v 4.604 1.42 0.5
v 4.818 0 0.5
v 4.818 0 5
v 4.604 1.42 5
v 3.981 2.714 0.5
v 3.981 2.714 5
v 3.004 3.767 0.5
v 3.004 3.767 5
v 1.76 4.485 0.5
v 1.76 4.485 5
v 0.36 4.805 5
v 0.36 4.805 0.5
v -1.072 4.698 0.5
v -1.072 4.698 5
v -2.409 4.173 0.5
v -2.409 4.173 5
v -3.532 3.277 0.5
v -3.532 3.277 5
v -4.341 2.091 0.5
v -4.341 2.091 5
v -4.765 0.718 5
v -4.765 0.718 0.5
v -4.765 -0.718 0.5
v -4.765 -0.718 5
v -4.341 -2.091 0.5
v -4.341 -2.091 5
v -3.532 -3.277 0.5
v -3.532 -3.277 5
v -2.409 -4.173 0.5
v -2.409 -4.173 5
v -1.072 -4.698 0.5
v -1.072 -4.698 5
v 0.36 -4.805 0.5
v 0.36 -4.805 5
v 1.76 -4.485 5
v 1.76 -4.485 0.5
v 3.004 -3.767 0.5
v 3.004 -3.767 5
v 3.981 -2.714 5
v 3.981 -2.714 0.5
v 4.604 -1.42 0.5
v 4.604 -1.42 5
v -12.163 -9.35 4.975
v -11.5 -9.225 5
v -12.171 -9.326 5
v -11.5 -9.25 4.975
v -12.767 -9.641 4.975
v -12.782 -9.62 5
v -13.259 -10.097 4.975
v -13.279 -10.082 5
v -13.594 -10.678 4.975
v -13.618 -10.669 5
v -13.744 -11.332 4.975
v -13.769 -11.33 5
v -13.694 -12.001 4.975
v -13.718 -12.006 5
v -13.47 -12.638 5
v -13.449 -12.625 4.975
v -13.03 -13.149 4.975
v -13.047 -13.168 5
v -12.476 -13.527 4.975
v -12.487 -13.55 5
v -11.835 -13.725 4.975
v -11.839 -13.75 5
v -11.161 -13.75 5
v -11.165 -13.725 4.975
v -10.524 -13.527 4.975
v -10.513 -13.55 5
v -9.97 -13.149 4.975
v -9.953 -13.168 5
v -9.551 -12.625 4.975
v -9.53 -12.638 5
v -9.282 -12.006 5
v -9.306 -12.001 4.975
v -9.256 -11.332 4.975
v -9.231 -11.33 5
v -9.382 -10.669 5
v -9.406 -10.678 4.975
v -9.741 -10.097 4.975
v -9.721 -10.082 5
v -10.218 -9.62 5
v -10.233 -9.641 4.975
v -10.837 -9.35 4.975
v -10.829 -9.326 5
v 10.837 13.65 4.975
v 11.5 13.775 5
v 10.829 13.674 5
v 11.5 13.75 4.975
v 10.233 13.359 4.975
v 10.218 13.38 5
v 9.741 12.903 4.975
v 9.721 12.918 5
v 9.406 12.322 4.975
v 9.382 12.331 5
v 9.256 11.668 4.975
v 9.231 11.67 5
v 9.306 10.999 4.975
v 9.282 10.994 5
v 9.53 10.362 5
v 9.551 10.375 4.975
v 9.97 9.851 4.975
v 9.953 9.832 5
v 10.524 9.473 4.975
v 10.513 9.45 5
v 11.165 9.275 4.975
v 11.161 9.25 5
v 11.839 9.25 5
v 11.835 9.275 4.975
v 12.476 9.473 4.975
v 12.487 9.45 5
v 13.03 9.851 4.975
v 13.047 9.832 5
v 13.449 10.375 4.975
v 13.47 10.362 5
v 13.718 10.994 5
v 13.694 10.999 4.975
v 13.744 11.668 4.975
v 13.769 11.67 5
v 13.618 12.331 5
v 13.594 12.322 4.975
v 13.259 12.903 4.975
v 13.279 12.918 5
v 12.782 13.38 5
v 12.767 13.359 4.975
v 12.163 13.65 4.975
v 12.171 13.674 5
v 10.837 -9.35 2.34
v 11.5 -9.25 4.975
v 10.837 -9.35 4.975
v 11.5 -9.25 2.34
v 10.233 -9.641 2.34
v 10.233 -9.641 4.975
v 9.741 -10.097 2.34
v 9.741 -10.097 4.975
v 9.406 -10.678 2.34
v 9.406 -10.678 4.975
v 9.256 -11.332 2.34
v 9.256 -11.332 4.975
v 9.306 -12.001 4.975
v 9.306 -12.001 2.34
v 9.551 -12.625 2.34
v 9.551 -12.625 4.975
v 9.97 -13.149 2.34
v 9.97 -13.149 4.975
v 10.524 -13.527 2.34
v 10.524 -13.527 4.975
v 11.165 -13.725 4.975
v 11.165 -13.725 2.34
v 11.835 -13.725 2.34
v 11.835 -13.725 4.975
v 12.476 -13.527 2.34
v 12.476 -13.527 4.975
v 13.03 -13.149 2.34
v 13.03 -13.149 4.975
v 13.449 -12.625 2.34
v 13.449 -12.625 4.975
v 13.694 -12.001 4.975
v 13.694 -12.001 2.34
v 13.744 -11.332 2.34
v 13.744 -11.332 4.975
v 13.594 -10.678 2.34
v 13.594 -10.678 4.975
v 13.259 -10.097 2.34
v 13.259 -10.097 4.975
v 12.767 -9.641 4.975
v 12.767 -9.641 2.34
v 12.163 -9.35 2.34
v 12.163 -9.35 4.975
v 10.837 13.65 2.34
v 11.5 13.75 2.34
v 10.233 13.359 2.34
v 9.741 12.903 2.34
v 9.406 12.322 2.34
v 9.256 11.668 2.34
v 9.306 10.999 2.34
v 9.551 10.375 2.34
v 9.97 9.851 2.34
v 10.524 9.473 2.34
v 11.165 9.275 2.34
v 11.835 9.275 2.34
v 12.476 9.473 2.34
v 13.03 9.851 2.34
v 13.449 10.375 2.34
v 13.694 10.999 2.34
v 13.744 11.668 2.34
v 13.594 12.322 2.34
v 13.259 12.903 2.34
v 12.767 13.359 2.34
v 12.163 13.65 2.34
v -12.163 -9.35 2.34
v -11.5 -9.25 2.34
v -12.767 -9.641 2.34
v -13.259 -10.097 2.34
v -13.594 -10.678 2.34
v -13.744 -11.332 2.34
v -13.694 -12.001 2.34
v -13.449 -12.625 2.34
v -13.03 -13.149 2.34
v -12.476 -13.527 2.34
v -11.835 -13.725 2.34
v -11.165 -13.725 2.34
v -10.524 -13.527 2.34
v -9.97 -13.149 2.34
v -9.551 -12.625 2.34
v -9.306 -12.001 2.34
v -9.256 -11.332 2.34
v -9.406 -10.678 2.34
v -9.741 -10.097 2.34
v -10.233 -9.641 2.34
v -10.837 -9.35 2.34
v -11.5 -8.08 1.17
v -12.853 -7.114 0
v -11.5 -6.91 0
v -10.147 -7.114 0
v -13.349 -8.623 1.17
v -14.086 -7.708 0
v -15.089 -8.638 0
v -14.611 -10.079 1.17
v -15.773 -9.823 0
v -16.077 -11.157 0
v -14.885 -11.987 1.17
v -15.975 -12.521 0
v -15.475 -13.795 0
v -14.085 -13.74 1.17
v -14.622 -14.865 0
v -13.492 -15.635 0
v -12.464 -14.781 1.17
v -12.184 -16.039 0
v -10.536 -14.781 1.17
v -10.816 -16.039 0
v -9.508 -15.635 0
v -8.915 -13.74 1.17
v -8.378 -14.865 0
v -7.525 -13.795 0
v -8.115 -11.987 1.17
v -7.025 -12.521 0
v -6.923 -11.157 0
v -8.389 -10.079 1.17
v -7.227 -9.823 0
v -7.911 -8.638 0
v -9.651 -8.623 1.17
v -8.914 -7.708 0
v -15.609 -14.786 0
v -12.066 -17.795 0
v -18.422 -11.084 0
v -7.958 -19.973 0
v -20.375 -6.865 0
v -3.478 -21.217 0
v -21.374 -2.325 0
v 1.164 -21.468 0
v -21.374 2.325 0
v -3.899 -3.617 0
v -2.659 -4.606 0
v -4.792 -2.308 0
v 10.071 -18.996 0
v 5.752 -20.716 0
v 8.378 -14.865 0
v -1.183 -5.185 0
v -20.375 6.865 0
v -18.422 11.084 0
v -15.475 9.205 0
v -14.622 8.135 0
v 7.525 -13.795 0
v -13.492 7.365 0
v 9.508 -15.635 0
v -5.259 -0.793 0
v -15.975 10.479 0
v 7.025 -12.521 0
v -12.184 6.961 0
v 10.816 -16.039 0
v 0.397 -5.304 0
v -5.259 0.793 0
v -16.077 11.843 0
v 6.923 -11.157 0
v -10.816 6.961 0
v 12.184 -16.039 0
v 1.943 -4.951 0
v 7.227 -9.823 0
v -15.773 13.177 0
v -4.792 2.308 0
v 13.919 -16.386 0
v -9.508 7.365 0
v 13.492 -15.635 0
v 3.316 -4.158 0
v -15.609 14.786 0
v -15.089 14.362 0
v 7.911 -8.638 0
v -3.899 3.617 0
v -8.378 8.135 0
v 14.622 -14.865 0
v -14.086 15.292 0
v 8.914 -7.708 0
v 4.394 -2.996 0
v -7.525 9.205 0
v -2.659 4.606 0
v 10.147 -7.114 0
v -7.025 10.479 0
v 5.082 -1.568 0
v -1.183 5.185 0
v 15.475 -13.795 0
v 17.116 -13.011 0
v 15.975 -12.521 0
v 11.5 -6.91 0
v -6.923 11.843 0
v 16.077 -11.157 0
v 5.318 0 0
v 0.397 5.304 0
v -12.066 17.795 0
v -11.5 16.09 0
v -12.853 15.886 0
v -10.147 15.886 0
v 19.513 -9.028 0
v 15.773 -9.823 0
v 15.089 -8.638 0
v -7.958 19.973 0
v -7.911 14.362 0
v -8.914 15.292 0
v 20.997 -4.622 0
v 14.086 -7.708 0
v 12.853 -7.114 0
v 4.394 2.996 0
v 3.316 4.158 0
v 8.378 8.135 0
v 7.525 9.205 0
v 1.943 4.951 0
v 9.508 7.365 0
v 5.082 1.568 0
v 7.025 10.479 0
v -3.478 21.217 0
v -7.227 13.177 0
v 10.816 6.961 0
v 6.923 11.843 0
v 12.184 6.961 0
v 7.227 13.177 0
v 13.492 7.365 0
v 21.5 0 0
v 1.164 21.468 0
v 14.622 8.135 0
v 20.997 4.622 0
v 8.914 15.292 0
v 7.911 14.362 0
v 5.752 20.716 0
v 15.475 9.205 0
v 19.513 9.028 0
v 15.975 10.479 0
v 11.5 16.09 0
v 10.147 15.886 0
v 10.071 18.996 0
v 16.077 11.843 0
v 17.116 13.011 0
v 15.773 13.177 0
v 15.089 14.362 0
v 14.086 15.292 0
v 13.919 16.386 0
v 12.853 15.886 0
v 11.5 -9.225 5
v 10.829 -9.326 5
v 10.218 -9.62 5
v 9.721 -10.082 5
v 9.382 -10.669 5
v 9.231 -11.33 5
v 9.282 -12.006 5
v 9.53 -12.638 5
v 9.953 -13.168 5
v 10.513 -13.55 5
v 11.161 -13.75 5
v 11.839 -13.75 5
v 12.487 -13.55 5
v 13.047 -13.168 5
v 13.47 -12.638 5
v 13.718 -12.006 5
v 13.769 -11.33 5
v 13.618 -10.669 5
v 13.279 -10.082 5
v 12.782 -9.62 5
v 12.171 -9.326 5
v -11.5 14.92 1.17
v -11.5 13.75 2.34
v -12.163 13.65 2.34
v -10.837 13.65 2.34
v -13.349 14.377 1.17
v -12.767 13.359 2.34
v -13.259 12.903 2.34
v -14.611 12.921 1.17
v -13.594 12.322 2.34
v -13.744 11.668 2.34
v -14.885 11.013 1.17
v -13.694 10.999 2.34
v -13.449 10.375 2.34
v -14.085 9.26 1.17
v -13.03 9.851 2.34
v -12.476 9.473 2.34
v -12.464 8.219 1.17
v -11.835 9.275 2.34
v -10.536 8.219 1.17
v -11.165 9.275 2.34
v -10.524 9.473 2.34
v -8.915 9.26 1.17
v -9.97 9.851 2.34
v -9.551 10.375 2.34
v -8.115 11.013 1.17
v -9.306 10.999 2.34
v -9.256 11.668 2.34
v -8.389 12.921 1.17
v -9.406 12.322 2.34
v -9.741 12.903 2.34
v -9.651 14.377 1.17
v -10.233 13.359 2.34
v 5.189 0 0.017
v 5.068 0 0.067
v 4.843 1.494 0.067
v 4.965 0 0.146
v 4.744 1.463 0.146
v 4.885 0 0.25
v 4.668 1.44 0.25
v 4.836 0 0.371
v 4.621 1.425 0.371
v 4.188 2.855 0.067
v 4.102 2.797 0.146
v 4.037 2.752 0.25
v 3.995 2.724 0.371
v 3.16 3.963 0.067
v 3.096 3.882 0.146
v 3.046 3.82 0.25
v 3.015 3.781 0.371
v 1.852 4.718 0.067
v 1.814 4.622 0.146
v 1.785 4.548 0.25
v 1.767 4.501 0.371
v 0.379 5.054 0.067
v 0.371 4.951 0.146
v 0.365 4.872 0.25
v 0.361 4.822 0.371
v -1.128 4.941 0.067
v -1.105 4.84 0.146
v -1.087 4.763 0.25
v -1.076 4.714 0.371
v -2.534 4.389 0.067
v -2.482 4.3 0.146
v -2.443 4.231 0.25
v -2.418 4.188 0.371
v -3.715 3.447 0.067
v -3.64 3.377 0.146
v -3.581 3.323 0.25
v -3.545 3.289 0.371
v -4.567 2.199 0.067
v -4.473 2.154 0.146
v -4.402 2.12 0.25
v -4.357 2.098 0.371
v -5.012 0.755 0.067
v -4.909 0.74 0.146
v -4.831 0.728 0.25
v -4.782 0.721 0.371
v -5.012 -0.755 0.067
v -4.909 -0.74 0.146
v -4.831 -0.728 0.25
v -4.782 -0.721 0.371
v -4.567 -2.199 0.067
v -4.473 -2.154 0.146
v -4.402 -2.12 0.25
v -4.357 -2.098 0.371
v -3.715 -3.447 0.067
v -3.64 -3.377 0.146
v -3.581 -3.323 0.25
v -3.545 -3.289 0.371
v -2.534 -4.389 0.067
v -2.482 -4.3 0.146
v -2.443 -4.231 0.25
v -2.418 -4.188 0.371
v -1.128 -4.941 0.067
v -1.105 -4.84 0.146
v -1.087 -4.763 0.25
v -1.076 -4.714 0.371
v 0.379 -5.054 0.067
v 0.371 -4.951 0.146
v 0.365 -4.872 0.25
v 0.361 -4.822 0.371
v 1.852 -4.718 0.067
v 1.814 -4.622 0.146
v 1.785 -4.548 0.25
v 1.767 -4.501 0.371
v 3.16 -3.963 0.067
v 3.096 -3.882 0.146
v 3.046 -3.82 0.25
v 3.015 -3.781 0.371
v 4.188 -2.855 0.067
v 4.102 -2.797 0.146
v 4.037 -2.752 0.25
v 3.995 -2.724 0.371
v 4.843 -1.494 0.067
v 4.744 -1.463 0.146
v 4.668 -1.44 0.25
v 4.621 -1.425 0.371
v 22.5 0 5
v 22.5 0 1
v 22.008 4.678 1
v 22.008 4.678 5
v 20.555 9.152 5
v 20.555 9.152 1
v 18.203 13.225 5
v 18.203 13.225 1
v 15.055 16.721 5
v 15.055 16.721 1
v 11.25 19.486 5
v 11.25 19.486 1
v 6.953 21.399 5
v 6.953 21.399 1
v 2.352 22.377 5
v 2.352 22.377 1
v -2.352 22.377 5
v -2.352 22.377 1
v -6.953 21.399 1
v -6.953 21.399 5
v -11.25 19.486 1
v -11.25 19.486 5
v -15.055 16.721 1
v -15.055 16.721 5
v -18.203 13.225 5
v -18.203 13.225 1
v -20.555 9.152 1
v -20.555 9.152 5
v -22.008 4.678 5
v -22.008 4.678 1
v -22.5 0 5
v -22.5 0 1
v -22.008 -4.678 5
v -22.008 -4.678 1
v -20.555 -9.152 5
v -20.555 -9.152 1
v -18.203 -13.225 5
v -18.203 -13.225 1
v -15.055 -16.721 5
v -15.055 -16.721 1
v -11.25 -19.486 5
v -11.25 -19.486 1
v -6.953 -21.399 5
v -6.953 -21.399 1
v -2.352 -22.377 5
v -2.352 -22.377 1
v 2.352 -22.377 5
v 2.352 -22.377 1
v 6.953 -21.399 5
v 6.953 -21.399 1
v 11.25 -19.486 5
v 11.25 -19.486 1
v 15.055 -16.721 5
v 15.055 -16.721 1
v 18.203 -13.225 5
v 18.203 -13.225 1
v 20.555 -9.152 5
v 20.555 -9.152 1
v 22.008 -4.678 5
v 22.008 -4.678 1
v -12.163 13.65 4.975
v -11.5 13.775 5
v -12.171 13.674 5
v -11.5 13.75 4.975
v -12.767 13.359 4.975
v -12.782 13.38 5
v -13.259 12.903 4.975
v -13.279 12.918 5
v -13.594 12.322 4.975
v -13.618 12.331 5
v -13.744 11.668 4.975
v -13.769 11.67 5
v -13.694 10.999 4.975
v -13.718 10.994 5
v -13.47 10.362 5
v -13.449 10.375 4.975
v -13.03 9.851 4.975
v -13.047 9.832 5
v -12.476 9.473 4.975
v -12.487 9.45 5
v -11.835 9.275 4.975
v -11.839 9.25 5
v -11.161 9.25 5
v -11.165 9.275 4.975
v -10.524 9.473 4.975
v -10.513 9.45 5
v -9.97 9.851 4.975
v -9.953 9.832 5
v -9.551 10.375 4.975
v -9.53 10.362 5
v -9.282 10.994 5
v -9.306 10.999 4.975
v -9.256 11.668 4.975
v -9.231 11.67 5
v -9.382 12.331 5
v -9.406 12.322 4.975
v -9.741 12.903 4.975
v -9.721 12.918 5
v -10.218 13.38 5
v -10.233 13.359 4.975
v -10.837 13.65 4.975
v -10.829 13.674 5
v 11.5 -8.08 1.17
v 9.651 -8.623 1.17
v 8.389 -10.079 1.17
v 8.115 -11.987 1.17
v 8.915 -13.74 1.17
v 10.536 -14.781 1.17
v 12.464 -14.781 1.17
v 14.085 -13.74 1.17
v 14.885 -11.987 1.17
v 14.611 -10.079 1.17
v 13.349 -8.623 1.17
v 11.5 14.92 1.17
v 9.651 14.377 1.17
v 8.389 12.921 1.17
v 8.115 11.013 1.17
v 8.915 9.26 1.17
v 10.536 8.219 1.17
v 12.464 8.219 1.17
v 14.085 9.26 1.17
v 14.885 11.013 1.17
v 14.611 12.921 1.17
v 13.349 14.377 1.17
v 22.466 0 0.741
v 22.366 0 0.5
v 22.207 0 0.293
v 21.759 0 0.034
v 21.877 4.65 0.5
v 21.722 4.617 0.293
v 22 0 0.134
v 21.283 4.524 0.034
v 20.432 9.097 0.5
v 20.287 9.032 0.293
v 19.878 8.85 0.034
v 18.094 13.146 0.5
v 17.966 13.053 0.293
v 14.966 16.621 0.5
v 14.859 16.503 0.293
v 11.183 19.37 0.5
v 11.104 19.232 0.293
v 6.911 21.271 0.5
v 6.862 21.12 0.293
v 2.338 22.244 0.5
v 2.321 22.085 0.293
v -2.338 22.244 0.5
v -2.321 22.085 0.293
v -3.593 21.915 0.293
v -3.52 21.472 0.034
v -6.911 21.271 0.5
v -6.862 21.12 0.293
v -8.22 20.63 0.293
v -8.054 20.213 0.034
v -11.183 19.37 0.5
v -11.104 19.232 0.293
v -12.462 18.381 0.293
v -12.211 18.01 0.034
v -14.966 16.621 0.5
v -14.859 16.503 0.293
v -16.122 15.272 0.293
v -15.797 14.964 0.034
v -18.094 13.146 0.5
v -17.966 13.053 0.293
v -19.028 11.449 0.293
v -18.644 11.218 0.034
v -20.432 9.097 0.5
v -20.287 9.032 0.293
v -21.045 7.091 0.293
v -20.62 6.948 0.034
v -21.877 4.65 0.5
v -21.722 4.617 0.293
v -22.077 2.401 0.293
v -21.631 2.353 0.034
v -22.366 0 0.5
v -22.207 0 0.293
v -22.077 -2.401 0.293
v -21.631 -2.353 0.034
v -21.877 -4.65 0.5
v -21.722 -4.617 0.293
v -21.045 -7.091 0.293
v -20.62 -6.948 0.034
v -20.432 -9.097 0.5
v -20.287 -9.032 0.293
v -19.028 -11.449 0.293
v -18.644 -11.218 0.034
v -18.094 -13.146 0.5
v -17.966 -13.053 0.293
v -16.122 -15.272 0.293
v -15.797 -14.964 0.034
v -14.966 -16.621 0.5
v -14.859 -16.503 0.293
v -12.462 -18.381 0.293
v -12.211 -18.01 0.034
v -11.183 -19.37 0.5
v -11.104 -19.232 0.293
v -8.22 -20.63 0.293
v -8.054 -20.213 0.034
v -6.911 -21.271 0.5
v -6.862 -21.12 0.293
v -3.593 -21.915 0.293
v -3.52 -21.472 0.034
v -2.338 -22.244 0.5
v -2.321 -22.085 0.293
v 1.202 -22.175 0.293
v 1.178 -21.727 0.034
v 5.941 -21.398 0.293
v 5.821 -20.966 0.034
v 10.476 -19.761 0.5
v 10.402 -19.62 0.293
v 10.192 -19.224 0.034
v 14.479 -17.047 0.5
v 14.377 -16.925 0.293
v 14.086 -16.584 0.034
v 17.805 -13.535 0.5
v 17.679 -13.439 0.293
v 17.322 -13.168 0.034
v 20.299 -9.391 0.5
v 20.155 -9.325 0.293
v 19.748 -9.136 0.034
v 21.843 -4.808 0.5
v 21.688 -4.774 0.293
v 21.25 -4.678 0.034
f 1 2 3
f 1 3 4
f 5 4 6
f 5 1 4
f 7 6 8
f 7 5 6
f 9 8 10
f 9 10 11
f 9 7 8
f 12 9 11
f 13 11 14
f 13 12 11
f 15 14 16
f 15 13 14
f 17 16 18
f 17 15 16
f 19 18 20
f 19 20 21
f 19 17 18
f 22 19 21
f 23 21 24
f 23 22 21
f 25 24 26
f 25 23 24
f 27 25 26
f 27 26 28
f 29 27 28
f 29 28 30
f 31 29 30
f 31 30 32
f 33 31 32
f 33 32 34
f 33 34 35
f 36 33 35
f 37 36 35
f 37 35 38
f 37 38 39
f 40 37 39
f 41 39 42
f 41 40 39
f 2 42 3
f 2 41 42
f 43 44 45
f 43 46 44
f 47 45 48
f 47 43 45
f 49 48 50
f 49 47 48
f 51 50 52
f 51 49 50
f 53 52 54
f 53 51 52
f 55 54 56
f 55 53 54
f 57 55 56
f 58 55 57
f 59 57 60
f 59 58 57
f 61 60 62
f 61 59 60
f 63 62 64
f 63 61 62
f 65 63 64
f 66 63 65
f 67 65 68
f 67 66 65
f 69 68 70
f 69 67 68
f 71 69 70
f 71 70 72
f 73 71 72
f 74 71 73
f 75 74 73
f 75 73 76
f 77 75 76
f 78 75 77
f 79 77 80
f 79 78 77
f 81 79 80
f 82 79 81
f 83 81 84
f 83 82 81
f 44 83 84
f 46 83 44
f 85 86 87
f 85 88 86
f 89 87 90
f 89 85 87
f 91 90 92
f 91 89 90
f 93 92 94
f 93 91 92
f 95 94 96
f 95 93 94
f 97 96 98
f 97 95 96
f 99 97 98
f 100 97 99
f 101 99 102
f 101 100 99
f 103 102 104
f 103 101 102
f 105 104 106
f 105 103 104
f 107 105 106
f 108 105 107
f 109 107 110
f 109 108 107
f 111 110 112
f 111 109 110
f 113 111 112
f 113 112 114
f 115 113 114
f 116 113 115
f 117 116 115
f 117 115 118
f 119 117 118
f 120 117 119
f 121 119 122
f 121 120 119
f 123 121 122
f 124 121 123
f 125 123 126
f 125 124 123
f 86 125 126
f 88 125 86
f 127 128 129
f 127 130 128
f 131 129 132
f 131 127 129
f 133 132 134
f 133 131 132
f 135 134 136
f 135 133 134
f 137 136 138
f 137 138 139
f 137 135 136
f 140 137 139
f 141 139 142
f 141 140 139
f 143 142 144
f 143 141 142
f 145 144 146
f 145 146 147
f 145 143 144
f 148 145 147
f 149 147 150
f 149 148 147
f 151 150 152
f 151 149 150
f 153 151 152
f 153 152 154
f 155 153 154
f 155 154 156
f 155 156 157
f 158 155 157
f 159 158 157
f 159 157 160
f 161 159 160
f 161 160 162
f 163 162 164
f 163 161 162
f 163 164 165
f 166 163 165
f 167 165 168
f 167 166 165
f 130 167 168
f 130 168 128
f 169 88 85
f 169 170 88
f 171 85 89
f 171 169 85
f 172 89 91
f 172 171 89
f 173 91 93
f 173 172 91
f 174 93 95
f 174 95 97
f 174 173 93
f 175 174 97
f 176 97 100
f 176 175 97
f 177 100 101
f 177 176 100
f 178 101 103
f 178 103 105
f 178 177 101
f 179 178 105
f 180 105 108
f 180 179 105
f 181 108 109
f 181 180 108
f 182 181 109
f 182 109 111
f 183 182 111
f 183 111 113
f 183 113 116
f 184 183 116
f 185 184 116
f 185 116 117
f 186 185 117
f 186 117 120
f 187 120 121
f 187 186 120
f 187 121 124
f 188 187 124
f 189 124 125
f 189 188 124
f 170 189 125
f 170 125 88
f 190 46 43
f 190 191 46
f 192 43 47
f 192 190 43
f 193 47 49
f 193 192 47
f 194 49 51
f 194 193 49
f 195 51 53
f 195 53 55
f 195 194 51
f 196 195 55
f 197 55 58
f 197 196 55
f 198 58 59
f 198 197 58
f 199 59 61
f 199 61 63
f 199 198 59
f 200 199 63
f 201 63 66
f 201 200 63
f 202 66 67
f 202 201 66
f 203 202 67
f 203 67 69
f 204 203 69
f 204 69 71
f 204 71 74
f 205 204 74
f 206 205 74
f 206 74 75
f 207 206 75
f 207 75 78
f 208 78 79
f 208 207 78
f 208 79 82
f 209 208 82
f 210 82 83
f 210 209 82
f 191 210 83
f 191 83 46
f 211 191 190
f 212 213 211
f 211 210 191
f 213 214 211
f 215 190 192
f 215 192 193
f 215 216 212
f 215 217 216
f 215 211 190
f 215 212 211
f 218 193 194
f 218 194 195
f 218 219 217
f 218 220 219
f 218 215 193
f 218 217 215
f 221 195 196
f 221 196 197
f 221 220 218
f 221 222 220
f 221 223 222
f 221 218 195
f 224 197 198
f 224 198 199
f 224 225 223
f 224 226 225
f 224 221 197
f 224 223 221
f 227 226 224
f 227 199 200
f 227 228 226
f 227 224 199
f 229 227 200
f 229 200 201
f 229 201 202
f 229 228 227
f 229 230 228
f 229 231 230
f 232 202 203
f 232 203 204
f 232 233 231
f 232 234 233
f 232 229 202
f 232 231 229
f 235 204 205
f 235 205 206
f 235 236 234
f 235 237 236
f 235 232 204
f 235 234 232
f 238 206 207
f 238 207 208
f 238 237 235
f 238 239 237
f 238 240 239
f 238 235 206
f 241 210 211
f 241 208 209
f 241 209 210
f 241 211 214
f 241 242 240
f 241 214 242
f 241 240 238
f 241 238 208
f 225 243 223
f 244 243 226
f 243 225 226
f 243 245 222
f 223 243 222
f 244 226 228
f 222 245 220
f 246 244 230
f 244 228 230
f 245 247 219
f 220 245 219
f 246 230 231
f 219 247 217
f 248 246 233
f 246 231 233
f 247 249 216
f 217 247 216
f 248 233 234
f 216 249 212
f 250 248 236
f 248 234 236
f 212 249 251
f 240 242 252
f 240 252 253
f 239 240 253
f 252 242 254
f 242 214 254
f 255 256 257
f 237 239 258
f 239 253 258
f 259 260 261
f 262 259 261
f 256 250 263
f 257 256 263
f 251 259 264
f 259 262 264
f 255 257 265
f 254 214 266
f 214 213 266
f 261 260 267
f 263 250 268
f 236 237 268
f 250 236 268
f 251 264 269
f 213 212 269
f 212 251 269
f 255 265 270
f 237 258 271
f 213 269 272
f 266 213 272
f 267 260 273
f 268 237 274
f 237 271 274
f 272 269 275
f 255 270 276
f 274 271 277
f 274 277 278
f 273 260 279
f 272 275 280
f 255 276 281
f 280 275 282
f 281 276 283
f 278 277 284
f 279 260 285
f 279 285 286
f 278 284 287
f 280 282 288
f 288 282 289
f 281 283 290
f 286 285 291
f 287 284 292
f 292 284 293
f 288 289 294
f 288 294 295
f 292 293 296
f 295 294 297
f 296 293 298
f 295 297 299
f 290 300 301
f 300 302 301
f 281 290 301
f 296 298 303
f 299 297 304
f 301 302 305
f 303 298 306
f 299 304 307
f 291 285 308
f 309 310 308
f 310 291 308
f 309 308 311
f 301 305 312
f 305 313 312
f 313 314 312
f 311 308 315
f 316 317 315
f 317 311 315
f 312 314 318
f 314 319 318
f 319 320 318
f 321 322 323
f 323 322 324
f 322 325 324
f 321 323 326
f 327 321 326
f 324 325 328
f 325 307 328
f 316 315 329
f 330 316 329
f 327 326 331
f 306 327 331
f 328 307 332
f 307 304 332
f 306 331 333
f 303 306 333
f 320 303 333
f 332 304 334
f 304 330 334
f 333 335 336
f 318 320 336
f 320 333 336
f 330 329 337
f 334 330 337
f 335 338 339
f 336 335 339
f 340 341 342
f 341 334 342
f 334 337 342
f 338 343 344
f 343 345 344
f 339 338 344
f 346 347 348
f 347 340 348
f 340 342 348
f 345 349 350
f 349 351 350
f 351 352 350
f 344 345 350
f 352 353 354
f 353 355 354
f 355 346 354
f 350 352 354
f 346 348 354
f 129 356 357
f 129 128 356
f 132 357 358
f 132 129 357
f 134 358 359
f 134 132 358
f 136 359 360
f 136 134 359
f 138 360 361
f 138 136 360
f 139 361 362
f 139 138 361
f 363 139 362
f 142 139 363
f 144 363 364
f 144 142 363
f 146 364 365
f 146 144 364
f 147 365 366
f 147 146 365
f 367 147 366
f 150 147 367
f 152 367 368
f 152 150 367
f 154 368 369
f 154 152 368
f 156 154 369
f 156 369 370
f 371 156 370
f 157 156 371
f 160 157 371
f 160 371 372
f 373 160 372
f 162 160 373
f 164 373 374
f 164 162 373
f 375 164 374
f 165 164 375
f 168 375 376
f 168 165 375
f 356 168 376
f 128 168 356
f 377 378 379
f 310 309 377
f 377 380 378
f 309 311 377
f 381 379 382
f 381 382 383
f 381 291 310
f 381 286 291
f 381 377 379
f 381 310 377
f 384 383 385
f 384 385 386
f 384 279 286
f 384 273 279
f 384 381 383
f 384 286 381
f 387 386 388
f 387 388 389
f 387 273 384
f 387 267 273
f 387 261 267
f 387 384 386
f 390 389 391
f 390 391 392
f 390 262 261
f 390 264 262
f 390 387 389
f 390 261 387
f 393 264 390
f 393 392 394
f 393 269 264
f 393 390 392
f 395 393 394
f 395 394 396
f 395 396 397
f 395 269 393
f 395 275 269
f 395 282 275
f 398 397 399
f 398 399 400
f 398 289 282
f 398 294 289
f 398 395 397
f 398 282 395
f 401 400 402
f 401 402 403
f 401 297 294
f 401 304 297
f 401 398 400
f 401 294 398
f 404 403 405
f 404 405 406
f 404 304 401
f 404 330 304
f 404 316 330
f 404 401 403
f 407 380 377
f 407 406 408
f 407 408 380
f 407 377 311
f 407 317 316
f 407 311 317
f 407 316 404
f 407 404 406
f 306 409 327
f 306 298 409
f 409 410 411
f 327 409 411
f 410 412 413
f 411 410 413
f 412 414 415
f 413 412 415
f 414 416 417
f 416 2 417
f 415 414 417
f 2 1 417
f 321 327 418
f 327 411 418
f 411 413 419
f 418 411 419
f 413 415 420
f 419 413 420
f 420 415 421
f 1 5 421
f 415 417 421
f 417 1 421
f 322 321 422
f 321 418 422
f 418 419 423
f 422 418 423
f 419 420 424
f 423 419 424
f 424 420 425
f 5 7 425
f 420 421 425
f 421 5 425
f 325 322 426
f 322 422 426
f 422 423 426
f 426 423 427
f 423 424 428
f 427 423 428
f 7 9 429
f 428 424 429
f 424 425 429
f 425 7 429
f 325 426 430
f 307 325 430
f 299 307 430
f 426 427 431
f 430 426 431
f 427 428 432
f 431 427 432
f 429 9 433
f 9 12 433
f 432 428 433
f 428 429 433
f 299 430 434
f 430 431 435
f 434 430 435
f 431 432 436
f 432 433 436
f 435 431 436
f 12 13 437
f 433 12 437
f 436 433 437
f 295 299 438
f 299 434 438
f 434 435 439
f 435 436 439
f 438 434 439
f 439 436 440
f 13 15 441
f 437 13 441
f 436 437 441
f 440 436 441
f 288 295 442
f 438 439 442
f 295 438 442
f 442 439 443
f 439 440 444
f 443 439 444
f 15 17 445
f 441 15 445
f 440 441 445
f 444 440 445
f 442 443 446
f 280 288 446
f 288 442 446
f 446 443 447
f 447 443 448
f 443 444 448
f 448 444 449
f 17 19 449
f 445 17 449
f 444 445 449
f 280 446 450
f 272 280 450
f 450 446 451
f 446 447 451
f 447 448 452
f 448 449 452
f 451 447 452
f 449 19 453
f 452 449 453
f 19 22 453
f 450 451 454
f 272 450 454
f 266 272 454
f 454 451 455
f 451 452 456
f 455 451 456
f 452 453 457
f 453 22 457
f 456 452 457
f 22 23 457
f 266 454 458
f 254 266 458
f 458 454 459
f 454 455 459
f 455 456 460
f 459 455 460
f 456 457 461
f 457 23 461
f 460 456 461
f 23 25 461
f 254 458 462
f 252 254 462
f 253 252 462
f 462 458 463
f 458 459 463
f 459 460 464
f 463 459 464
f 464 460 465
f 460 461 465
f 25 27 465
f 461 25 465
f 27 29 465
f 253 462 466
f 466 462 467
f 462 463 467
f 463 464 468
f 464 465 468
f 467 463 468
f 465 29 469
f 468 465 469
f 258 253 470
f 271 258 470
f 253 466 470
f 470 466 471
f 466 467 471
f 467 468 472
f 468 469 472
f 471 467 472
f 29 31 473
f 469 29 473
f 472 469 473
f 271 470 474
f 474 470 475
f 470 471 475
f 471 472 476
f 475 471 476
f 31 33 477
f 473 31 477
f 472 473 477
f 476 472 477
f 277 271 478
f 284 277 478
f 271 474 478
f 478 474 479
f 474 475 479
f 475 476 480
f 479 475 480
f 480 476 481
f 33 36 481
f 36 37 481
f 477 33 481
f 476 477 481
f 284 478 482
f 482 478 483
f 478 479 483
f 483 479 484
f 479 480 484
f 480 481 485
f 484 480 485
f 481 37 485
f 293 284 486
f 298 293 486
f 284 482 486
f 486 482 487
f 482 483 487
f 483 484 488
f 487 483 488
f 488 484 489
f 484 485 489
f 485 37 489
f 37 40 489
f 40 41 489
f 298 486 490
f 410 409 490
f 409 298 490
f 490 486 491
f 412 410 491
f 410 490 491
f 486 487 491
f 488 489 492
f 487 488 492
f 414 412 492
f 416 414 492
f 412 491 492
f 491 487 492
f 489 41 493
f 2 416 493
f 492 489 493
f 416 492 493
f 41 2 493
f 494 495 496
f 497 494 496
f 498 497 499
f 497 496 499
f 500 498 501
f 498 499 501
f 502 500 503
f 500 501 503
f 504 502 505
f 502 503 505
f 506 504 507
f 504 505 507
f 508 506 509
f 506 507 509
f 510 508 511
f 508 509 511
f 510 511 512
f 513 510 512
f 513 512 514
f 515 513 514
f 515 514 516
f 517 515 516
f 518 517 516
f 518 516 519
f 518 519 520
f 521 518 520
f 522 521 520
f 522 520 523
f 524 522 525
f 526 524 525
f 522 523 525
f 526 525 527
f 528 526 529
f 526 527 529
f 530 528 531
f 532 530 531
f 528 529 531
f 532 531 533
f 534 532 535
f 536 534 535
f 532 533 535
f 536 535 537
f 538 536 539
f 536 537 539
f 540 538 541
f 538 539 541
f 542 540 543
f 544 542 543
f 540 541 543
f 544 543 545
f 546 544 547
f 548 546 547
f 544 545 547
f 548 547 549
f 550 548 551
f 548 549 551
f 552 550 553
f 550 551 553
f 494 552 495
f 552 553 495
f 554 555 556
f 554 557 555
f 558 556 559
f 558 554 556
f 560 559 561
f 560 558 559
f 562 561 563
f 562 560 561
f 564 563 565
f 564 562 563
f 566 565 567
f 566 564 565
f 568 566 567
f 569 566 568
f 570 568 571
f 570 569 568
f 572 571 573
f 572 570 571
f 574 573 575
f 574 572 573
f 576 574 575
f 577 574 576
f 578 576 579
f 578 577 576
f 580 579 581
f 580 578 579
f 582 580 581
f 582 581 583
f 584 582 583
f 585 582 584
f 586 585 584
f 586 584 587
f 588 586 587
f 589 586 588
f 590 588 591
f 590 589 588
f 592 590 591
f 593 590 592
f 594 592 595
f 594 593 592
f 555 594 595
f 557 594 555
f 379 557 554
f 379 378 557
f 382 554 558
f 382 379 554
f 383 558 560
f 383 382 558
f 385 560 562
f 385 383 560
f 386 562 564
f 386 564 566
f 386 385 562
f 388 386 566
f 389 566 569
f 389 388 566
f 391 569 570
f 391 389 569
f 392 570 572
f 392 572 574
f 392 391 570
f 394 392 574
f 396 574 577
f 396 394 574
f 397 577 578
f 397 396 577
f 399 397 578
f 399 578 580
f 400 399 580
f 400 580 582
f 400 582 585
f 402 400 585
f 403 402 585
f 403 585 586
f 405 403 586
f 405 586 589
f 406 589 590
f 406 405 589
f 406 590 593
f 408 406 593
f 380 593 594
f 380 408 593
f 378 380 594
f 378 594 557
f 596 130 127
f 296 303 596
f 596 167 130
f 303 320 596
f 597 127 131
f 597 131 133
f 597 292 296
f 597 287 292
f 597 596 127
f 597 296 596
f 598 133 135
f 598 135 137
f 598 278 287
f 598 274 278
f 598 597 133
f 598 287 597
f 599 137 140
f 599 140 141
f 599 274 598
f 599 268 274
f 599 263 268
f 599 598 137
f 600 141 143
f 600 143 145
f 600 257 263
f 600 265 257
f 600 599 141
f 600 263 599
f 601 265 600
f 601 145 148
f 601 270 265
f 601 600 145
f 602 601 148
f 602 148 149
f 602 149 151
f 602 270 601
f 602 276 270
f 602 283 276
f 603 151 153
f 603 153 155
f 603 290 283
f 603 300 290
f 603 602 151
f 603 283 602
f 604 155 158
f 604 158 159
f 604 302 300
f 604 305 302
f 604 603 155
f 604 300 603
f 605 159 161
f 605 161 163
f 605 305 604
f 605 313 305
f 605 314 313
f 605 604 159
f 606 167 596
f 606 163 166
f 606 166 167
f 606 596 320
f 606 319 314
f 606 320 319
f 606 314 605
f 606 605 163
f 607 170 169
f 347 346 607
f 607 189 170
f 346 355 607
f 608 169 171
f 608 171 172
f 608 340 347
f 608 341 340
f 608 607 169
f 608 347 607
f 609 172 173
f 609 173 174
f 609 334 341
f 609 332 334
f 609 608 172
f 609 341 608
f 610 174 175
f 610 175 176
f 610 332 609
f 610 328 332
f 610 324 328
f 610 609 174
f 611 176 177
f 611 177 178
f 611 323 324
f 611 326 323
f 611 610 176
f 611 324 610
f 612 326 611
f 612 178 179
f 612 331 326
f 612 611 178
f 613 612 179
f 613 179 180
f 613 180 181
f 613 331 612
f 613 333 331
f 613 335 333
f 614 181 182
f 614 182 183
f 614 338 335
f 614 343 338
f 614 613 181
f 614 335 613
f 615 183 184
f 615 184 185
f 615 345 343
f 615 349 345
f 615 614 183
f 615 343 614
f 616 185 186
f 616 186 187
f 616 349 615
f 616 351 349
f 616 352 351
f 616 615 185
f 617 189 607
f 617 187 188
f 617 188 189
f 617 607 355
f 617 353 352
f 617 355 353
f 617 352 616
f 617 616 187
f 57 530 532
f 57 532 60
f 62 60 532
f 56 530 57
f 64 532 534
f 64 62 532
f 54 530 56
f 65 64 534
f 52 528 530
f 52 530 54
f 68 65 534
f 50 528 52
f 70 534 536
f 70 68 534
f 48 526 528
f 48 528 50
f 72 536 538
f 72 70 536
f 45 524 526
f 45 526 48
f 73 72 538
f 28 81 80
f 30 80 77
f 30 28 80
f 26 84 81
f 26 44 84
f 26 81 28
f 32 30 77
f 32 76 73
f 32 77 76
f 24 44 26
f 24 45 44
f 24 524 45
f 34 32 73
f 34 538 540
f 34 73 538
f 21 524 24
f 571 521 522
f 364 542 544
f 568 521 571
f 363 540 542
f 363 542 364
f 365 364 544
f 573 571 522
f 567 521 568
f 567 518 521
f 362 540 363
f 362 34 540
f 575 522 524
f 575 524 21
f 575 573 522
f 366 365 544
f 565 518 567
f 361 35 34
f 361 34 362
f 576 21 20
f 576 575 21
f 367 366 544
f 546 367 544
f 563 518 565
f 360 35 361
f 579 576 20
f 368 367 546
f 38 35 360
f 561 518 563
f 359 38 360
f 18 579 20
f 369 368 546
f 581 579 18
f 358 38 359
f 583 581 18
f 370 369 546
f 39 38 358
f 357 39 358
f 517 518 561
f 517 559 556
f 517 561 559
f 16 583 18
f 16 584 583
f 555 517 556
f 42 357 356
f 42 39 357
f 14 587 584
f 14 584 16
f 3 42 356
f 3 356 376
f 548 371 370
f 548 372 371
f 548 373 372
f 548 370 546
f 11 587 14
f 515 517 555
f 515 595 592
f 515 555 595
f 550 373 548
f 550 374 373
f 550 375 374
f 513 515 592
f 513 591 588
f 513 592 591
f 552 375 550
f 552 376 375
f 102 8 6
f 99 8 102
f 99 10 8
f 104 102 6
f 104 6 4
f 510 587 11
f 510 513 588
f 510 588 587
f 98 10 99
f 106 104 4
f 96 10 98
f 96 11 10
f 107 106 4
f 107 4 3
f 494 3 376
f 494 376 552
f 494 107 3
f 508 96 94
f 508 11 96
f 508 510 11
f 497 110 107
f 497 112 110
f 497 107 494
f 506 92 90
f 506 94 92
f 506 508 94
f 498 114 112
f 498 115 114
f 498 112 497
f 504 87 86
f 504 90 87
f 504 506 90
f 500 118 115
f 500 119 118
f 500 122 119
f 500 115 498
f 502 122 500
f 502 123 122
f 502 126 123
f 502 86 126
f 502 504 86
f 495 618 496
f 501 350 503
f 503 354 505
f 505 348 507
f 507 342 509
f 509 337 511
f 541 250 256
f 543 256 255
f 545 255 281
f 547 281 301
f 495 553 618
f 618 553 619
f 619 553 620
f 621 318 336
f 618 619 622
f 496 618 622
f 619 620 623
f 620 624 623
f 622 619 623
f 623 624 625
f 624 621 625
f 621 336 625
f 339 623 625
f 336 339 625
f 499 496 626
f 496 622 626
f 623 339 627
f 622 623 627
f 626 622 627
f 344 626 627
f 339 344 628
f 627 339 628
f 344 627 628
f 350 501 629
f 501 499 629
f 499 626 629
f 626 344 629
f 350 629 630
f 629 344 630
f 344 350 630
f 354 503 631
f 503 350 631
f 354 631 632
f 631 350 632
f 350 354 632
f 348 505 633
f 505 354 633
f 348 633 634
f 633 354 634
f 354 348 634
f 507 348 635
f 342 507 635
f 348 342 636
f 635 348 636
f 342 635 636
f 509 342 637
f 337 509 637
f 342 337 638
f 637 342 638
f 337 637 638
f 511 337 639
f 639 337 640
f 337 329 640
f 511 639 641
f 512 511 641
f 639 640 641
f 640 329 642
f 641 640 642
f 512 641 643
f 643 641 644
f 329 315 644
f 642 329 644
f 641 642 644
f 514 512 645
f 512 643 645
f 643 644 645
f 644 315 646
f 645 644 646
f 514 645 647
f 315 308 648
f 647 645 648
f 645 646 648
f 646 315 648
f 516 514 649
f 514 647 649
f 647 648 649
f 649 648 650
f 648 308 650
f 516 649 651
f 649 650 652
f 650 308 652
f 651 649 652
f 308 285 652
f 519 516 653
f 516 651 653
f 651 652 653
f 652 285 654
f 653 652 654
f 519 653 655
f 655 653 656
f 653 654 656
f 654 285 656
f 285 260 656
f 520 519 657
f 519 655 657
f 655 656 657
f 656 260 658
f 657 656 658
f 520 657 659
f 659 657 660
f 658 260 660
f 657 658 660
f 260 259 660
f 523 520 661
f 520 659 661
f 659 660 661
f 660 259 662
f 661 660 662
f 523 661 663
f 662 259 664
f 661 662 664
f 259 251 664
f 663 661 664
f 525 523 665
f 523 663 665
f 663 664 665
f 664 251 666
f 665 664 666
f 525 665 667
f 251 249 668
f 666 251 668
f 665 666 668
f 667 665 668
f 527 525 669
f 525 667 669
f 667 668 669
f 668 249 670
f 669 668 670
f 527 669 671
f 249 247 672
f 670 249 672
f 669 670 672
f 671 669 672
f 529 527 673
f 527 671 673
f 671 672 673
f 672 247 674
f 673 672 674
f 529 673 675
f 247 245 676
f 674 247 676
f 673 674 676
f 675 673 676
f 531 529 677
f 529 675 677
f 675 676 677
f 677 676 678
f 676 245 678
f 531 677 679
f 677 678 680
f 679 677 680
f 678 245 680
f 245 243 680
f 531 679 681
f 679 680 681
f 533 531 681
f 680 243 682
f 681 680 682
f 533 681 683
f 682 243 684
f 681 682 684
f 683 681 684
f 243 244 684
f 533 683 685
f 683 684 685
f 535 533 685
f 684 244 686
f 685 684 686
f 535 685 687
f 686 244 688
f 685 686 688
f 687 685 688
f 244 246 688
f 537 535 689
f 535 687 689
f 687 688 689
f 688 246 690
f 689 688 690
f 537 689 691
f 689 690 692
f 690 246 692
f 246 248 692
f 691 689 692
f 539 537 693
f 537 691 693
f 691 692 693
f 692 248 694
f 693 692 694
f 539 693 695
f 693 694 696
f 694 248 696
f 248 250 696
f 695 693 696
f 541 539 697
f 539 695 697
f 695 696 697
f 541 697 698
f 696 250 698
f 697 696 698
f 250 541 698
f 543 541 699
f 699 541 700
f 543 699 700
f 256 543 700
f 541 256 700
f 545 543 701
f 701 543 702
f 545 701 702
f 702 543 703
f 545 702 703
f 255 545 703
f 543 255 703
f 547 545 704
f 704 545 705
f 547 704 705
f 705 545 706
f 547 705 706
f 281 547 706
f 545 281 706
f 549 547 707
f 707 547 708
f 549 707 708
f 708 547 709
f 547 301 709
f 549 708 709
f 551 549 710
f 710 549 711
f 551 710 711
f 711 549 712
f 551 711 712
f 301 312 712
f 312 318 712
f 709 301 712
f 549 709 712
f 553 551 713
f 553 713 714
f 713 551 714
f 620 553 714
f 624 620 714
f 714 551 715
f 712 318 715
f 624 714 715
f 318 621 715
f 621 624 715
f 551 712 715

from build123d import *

# Parameters (mm, degrees)
SKIZZE1_R                                   = 22.5
SKIZZE1_R_2                                 = 4.818475195
SKIZZE1_R_3                                 = 2
AUFSATZ_LINEAR_AUSTRAGEN1_DEPTH             = 5
VERRUNDUNG1_R                               = 1
VERRUNDUNG2_R                               = 0.5
FORMSENKUNG_F_R_M4_SENKSCHRAUBE_MIT_2_COUNT = 2
FORMSENKUNG_F_R_M4_SENKSCHRAUBE_MIT_2_PITCH = 23
FORMSENKUNG_F_R_M4_SENKSCHRAUBE_MIT_3_COUNT = 2
FORMSENKUNG_F_R_M4_SENKSCHRAUBE_MIT_3_PITCH = 23
FORMSENKUNG_F_R_M4_SENKSCHRAUBE_MIT_4_COUNT = 2
FORMSENKUNG_F_R_M4_SENKSCHRAUBE_MIT_4_PITCH = 32.526911935


with BuildPart() as part:
    # Skizze1 → Aufsatz-Linear austragen1 (new body)
    with BuildSketch(Plane.XY):
        Circle(SKIZZE1_R)
        Circle(SKIZZE1_R_2, mode=Mode.SUBTRACT)
        with Locations((-11.5, 11.5)):
            Circle(SKIZZE1_R_3, mode=Mode.SUBTRACT)
        with Locations((11.5, 11.5)):
            Circle(SKIZZE1_R_3, mode=Mode.SUBTRACT)
        with Locations((-11.5, -11.5)):
            Circle(SKIZZE1_R_3, mode=Mode.SUBTRACT)
        with Locations((11.5, -11.5)):
            Circle(SKIZZE1_R_3, mode=Mode.SUBTRACT)
    extrude(amount=AUFSATZ_LINEAR_AUSTRAGEN1_DEPTH)

    # Verrundung1
    verrundung1_edges = [part.edges().sort_by_distance(p)[0] for p in [
        (-22.5, 0, 0),
    ]]
    fillet(verrundung1_edges, radius=VERRUNDUNG1_R)

    # Verrundung2
    verrundung2_edges = [part.edges().sort_by_distance(p)[0] for p in [
        (-4.818475195, 0, 0),
    ]]
    fillet(verrundung2_edges, radius=VERRUNDUNG2_R)

    # Skizze2 → Formsenkung für M4 Senkschraube mit Innensechskant1 (revolve, cut)
    with BuildSketch(Plane(origin=(11.5, 11.5, 0), x_dir=(0, 1, 0), z_dir=(1, 0, 0))):
        Polygon((0, 0), (0, 5), (2.275, 5), (2.25, 4.975), (2.25, 2.34), (4.59, 0), align=None)
    formsenkung_f_r_m4_senkschraube_mit_inne = revolve(axis=Axis((11.5, 11.5, -6.35), (0, 0, 1)), mode=Mode.SUBTRACT)

    # Formsenkung f_r M4 Senkschraube mit  2: Formsenkung für M4 Senkschraube mit Innensechskant1 ×2
    with Locations(*[(-i * FORMSENKUNG_F_R_M4_SENKSCHRAUBE_MIT_2_PITCH, 0, 0) for i in range(1, FORMSENKUNG_F_R_M4_SENKSCHRAUBE_MIT_2_COUNT)]):
        add(formsenkung_f_r_m4_senkschraube_mit_inne, mode=Mode.SUBTRACT)

    # Formsenkung f_r M4 Senkschraube mit  3: Formsenkung für M4 Senkschraube mit Innensechskant1 ×2
    with Locations(*[(0, -i * FORMSENKUNG_F_R_M4_SENKSCHRAUBE_MIT_3_PITCH, 0) for i in range(1, FORMSENKUNG_F_R_M4_SENKSCHRAUBE_MIT_3_COUNT)]):
        add(formsenkung_f_r_m4_senkschraube_mit_inne, mode=Mode.SUBTRACT)

    # Formsenkung f_r M4 Senkschraube mit  4: Formsenkung für M4 Senkschraube mit Innensechskant1 ×2
    with Locations(*[Vector(-0.7071067811865476, -0.7071067811865476, 0) * (i * FORMSENKUNG_F_R_M4_SENKSCHRAUBE_MIT_4_PITCH) for i in range(1, FORMSENKUNG_F_R_M4_SENKSCHRAUBE_MIT_4_COUNT)]):
        add(formsenkung_f_r_m4_senkschraube_mit_inne, mode=Mode.SUBTRACT)


solid = part.part
